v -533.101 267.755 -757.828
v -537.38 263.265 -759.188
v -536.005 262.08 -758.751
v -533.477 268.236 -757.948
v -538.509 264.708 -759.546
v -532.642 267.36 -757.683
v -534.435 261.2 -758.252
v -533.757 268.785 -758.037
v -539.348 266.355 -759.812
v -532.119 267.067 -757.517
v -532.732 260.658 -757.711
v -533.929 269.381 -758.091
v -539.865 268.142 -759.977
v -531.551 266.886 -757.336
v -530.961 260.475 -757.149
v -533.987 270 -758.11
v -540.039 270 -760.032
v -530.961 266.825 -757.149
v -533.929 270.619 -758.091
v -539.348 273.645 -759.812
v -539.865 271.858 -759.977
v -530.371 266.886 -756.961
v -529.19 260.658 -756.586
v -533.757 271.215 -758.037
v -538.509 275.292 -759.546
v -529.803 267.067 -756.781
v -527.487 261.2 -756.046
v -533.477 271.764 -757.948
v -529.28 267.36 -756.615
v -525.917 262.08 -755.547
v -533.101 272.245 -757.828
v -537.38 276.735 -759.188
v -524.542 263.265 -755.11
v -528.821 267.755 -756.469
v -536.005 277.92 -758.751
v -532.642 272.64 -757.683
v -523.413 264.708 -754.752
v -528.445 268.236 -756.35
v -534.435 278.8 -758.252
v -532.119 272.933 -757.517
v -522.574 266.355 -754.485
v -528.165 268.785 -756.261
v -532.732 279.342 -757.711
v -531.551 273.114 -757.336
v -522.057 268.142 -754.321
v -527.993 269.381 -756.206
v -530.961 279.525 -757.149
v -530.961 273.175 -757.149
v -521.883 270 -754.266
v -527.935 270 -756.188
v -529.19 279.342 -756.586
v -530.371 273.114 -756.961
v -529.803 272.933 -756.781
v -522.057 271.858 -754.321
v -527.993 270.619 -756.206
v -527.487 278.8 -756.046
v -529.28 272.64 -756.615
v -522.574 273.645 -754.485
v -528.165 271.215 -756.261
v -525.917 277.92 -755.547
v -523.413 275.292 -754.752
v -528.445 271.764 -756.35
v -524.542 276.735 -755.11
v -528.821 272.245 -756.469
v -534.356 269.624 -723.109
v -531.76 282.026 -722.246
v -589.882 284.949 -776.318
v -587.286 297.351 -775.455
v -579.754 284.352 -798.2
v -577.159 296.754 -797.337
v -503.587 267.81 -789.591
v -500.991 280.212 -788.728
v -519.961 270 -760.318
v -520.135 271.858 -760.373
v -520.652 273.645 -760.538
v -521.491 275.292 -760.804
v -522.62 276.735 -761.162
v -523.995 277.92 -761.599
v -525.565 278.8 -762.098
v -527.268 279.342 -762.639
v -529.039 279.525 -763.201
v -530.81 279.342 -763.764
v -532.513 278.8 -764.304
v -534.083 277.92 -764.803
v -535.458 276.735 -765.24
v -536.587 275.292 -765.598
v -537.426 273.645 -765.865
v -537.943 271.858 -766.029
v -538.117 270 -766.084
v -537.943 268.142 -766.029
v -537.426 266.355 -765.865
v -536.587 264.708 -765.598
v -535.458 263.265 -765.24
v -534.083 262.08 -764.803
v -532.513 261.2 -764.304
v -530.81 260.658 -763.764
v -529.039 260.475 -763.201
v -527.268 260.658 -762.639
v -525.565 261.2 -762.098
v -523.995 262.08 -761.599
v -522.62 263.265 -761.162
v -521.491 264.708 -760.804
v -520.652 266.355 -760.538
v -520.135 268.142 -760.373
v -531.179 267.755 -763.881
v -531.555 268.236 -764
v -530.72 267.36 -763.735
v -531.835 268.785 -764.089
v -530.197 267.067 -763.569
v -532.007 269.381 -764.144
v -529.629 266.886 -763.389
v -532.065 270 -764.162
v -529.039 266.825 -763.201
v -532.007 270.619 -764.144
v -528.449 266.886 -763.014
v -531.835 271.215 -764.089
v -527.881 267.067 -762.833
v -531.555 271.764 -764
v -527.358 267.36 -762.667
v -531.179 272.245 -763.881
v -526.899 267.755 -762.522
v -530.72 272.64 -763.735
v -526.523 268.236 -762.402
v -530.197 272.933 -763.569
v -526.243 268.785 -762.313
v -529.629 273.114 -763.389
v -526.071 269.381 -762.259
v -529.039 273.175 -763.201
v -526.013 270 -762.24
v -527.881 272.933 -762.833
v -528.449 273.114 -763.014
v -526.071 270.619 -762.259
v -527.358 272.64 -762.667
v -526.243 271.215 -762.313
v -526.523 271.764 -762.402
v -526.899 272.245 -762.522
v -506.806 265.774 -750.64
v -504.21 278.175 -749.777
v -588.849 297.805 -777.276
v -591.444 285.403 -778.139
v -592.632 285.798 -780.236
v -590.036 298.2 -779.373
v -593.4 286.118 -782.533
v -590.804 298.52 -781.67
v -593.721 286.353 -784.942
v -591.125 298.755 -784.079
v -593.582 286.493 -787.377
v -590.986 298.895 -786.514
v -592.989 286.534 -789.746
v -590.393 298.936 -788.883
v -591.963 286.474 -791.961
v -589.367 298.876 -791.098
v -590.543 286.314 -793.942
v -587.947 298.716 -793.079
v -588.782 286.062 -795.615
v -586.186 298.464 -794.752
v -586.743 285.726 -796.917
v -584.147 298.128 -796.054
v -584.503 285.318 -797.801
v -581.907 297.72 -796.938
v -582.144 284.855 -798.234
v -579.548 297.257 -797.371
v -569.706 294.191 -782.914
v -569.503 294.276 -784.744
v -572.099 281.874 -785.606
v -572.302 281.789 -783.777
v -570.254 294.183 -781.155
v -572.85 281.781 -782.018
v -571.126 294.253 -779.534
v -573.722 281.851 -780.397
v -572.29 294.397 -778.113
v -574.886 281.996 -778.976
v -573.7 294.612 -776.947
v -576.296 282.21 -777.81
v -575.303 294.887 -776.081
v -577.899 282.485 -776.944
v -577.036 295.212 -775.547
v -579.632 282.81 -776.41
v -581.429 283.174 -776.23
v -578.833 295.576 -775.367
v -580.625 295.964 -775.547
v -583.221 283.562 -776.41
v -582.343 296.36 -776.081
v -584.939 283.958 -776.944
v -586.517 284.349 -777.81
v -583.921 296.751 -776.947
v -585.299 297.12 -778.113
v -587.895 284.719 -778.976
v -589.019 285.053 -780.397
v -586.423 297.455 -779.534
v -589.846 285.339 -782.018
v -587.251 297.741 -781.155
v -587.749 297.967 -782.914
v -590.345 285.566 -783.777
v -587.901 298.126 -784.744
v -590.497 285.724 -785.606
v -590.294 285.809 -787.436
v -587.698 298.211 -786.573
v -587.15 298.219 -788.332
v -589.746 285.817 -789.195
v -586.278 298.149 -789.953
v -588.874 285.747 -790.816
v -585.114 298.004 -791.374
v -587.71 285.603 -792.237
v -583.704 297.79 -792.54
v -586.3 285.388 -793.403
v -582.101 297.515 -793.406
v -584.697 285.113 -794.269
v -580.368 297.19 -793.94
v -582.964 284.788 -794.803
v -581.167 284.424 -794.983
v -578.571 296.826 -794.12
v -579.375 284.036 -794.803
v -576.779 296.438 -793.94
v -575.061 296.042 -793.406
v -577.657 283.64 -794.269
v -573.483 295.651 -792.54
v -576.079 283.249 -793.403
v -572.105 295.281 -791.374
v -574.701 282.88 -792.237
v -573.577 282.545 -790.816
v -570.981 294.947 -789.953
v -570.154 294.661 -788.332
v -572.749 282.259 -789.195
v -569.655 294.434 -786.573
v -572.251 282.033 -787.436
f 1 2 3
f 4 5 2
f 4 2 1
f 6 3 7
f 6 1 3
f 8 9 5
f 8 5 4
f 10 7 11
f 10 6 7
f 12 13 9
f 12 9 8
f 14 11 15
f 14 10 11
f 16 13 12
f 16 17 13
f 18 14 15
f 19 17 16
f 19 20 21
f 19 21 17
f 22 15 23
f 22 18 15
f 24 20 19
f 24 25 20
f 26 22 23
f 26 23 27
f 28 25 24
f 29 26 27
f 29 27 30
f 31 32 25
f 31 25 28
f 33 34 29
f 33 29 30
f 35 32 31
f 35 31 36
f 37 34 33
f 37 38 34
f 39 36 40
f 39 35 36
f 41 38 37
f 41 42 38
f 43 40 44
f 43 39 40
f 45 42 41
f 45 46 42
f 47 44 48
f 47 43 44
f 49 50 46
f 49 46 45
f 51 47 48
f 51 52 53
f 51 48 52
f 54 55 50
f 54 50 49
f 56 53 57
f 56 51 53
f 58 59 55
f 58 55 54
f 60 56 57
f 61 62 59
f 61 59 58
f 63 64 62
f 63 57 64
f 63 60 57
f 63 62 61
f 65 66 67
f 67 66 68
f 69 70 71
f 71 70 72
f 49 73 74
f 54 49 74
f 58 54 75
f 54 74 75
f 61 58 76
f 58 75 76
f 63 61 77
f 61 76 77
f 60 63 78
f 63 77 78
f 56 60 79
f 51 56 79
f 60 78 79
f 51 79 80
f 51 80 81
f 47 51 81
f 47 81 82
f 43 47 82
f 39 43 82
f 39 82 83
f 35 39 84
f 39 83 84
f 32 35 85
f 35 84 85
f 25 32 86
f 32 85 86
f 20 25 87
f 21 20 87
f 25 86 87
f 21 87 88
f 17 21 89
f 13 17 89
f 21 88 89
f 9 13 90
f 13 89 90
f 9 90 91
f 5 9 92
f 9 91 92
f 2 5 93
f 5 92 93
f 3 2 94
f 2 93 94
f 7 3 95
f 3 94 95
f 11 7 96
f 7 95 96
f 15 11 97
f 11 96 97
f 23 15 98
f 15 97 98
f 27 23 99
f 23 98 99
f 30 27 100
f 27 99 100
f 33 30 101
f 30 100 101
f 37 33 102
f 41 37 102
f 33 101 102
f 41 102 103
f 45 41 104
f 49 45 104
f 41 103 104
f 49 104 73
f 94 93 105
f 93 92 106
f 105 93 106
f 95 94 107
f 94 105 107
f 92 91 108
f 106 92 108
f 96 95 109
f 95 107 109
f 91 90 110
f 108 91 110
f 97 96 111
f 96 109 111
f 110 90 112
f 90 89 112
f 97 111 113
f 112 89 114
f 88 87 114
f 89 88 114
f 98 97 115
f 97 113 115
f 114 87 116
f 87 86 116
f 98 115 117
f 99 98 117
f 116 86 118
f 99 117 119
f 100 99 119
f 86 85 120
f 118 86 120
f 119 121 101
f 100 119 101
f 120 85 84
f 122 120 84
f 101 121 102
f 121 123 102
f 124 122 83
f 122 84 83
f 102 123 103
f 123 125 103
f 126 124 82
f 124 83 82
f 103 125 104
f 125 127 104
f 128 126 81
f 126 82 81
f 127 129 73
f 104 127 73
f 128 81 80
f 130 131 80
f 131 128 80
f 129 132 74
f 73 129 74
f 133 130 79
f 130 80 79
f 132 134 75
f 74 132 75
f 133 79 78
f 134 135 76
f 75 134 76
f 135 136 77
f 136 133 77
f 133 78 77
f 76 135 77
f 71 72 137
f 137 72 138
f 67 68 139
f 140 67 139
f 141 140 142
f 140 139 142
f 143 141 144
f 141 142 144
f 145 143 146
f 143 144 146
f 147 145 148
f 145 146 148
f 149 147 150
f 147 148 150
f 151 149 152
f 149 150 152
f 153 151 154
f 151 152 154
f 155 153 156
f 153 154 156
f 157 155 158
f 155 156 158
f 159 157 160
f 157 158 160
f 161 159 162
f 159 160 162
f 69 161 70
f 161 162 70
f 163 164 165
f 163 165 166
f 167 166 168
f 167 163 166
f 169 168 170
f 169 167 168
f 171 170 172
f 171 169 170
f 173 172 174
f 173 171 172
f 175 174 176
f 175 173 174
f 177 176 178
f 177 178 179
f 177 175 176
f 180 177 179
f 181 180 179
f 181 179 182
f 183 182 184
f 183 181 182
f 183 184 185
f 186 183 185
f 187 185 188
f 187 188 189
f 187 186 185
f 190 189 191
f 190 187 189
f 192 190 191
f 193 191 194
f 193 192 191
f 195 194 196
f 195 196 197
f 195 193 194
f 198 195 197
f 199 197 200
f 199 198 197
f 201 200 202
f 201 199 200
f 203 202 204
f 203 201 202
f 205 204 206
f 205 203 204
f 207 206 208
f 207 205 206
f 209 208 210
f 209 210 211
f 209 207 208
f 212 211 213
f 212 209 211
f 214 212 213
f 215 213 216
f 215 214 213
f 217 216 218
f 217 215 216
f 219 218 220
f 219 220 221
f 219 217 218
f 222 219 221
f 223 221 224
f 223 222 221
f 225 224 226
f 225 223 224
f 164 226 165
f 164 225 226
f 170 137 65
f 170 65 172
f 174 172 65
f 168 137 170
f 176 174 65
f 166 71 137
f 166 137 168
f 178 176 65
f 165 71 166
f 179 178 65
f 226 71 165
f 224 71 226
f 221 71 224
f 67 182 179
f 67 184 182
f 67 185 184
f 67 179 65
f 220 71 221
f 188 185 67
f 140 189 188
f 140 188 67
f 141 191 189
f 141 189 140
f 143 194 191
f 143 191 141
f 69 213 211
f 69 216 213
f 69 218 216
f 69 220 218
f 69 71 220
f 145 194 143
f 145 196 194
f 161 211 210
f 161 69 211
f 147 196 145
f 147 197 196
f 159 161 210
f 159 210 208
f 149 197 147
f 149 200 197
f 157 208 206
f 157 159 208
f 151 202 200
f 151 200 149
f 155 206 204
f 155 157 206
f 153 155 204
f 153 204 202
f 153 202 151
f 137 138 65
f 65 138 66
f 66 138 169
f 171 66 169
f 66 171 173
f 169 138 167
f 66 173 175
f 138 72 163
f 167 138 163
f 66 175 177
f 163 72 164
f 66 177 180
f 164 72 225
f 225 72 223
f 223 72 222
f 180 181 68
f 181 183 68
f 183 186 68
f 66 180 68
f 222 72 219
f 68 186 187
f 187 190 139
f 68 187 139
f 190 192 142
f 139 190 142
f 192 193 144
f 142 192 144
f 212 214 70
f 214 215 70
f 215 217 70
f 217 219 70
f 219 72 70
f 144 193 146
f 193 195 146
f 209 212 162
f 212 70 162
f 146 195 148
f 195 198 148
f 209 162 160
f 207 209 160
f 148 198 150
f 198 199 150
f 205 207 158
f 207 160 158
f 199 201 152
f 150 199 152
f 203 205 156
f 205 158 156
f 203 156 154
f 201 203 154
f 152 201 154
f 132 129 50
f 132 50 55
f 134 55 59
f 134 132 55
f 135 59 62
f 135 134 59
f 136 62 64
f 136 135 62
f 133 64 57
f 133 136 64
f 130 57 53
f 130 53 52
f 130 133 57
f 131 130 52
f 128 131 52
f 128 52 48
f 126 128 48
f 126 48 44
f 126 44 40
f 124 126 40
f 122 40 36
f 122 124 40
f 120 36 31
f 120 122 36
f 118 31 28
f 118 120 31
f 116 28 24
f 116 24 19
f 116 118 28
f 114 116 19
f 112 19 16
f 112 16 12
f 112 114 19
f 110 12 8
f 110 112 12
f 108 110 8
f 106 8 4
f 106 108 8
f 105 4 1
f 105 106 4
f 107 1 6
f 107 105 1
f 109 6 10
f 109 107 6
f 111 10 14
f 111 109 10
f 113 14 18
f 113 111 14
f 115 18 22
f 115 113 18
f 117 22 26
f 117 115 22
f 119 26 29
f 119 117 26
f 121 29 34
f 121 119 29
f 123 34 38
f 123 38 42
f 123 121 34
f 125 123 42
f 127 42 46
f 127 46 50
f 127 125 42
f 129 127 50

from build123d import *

# Parameters (mm, degrees)
BOSS_EXTRUDE1_DEPTH      = 3.175
BOSS_EXTRUDE1_DEPTH_BACK = 3.175
ROD_END_BLOCK_R          = 9.525
ROD_END_BLOCK_R_2        = 3.175
BOSS_EXTRUDE2_DEPTH      = 6.35
BOSS_EXTRUDE2_DEPTH_BACK = 6.35
SKETCH37_R               = 9.398


with BuildPart() as part:
    # rod end block → Boss-Extrude1 (new, two sides: drawn at the far end of the back side and taken through both)
    with BuildSketch(Plane(origin=(170.739381635, 0, -537.639710231), x_dir=(0.9530935317801348, 0, 0.3026759317799639), z_dir=(-0.3026759317799638, 0, 0.9530935317801347)).offset(-BOSS_EXTRUDE1_DEPTH_BACK)):
        with Locations((-735.226248284, 270)):
            Circle(ROD_END_BLOCK_R)
        with Locations((-735.226248284, 270)):
            Circle(ROD_END_BLOCK_R_2, mode=Mode.SUBTRACT)
    extrude(amount=BOSS_EXTRUDE1_DEPTH + BOSS_EXTRUDE1_DEPTH_BACK)


with BuildPart() as body_2:
    # Sketch37 → Boss-Extrude2 (new, two sides: drawn at the far end of the back side and taken through both)
    with BuildSketch(Plane(origin=(22.746911344, 108.672934845, 7.562045718), x_dir=(-0.9788870741818188, 0.20390872100911547, 0.014189062554840587), z_dir=(-0.2044018003828696, -0.9765257005314425, -0.06795189623415251)).offset(-BOSS_EXTRUDE2_DEPTH_BACK)):
        with BuildLine():
            Line((614.170295266, 816.013723782), (536.360328554, 806.277453435))
            Line((536.360328554, 806.277453435), (539.648481179, 767.278078165))
            Line((539.648481179, 767.278078165), (567.792401082, 740.080964501))
            Line((567.792401082, 740.080964501), (624.516091521, 794.22529775))
            ThreePointArc((624.516091521, 794.22529775), (627.2195154, 808.859423994), (614.170295266, 816.013723782))
        make_face()
        with Locations(Location((615.747134927, 803.411994668, 0), (0, 0, 180.814884333))):
            Circle(SKETCH37_R, mode=Mode.SUBTRACT)
    extrude(amount=BOSS_EXTRUDE2_DEPTH + BOSS_EXTRUDE2_DEPTH_BACK)


solid = Compound([part.part, body_2.part])
